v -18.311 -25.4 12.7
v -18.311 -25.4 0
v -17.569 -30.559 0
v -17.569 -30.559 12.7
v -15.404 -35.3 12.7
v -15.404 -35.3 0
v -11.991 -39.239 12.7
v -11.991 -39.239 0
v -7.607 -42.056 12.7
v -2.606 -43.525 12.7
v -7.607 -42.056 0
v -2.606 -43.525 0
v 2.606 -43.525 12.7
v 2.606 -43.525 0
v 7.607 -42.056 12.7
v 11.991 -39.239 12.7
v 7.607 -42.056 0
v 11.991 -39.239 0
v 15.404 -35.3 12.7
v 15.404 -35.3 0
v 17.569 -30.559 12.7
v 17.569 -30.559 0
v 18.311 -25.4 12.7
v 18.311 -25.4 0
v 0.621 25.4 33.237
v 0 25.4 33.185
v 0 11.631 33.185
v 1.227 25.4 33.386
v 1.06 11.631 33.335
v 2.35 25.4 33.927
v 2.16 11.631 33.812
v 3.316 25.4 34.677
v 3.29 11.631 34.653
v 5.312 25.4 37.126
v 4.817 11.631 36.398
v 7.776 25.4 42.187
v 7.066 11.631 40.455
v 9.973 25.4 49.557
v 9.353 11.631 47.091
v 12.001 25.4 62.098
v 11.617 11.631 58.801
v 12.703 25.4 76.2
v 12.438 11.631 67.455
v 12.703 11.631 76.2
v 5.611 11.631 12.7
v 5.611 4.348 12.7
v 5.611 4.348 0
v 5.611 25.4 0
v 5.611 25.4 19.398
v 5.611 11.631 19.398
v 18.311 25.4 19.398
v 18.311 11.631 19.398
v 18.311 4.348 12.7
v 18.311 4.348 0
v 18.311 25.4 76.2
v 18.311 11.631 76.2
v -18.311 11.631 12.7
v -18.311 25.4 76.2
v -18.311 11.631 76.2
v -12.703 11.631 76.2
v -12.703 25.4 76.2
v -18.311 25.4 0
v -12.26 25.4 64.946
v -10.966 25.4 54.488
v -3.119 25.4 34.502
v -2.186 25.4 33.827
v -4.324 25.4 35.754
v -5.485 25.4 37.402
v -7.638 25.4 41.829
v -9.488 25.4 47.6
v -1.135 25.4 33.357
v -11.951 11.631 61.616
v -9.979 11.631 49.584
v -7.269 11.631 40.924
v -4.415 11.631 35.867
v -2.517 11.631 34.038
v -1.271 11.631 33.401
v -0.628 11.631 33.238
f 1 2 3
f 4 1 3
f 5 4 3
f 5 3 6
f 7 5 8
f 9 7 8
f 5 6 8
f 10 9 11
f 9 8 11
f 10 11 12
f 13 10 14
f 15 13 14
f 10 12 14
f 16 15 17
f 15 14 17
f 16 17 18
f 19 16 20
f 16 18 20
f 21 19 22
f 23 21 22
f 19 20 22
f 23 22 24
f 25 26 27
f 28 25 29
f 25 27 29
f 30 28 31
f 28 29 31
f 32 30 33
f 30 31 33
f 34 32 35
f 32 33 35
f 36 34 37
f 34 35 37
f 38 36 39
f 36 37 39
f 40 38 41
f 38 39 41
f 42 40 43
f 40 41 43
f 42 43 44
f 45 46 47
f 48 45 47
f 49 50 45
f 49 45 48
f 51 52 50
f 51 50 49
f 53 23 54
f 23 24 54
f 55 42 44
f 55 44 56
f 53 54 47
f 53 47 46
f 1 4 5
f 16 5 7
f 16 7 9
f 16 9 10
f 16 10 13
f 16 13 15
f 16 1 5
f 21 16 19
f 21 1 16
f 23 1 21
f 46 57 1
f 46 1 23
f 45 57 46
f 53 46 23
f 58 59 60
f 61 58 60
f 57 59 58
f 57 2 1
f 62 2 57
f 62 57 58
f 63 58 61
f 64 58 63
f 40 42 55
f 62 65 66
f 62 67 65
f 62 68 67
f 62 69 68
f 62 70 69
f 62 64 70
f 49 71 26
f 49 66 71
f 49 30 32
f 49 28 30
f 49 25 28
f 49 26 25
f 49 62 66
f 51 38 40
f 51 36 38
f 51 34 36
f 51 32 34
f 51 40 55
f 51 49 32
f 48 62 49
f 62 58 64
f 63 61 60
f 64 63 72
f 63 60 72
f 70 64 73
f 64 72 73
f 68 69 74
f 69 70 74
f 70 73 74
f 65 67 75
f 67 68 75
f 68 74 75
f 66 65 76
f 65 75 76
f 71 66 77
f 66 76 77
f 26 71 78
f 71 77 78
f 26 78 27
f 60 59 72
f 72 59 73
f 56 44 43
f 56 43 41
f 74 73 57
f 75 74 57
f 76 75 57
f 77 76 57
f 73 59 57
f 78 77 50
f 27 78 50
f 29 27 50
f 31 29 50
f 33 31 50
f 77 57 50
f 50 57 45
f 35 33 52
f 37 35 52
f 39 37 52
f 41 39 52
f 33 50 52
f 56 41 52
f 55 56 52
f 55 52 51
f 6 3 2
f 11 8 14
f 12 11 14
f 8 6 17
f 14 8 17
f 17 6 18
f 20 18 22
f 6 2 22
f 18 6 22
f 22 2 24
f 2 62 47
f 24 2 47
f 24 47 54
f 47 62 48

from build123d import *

# Parameters (mm, degrees)
F0_W     = 36.6222700901
F0_H     = 50.8
F1_DEPTH = 12.7
F2_W     = 36.6222700901
F2_H     = 13.7693596348
F3_DEPTH = 63.5
F5_DEPTH = 15.24
F6_W     = 21.0523925066
F6_H     = 19.398285076
F7_DEPTH = 12.7


with BuildPart() as f1:
    # F0 (on Top) → F1 (new body)
    with BuildSketch(Plane.XY):
        Rectangle(F0_W, F0_H)
        with BuildLine():
            Line((18.311135045, -25.4), (-18.311135045, -25.4))
            ThreePointArc((-18.311135045, -25.4), (0, -43.711135045), (18.311135045, -25.4))
        make_face()
    extrude(amount=F1_DEPTH)

    # F2 (on face) → F3 (join)
    with BuildSketch(Plane.XY.offset(12.7)):
        with Locations((0, 18.5153201826)):
            Rectangle(F2_W, F2_H)
    extrude(amount=F3_DEPTH)

    # F4 (on face) → F5 (cut)
    with BuildSketch(Plane.XZ.offset(-11.6306403652)):
        with BuildLine():
            add(Edge.make_bspline(
                [(0, 33.1851541996), (22.002207295, 33.1851541996), (11.0011036475, 97.7074229002), (0, 162.2296916008), (-11.0011036475, 97.7074229002), (-22.002207295, 33.1851541996), (0, 33.1851541996)],
                knots=[0, 0, 0, 2.0943951024, 2.0943951024, 4.1887902048, 4.1887902048, 6.2831853072, 6.2831853072, 6.2831853072], degree=2, weights=[1, 0.5, 1, 0.5, 1, 0.5, 1]))
        make_face()
    extrude(amount=-F5_DEPTH, mode=Mode.SUBTRACT)

    # F6 (on face) → F7 (cut)
    with BuildSketch(Plane.YZ.offset(18.311135045)):
        with Locations((14.8738037467, 9.699142538)):
            Rectangle(F6_W, F6_H)
    extrude(amount=-F7_DEPTH, mode=Mode.SUBTRACT)


solid = f1.part
